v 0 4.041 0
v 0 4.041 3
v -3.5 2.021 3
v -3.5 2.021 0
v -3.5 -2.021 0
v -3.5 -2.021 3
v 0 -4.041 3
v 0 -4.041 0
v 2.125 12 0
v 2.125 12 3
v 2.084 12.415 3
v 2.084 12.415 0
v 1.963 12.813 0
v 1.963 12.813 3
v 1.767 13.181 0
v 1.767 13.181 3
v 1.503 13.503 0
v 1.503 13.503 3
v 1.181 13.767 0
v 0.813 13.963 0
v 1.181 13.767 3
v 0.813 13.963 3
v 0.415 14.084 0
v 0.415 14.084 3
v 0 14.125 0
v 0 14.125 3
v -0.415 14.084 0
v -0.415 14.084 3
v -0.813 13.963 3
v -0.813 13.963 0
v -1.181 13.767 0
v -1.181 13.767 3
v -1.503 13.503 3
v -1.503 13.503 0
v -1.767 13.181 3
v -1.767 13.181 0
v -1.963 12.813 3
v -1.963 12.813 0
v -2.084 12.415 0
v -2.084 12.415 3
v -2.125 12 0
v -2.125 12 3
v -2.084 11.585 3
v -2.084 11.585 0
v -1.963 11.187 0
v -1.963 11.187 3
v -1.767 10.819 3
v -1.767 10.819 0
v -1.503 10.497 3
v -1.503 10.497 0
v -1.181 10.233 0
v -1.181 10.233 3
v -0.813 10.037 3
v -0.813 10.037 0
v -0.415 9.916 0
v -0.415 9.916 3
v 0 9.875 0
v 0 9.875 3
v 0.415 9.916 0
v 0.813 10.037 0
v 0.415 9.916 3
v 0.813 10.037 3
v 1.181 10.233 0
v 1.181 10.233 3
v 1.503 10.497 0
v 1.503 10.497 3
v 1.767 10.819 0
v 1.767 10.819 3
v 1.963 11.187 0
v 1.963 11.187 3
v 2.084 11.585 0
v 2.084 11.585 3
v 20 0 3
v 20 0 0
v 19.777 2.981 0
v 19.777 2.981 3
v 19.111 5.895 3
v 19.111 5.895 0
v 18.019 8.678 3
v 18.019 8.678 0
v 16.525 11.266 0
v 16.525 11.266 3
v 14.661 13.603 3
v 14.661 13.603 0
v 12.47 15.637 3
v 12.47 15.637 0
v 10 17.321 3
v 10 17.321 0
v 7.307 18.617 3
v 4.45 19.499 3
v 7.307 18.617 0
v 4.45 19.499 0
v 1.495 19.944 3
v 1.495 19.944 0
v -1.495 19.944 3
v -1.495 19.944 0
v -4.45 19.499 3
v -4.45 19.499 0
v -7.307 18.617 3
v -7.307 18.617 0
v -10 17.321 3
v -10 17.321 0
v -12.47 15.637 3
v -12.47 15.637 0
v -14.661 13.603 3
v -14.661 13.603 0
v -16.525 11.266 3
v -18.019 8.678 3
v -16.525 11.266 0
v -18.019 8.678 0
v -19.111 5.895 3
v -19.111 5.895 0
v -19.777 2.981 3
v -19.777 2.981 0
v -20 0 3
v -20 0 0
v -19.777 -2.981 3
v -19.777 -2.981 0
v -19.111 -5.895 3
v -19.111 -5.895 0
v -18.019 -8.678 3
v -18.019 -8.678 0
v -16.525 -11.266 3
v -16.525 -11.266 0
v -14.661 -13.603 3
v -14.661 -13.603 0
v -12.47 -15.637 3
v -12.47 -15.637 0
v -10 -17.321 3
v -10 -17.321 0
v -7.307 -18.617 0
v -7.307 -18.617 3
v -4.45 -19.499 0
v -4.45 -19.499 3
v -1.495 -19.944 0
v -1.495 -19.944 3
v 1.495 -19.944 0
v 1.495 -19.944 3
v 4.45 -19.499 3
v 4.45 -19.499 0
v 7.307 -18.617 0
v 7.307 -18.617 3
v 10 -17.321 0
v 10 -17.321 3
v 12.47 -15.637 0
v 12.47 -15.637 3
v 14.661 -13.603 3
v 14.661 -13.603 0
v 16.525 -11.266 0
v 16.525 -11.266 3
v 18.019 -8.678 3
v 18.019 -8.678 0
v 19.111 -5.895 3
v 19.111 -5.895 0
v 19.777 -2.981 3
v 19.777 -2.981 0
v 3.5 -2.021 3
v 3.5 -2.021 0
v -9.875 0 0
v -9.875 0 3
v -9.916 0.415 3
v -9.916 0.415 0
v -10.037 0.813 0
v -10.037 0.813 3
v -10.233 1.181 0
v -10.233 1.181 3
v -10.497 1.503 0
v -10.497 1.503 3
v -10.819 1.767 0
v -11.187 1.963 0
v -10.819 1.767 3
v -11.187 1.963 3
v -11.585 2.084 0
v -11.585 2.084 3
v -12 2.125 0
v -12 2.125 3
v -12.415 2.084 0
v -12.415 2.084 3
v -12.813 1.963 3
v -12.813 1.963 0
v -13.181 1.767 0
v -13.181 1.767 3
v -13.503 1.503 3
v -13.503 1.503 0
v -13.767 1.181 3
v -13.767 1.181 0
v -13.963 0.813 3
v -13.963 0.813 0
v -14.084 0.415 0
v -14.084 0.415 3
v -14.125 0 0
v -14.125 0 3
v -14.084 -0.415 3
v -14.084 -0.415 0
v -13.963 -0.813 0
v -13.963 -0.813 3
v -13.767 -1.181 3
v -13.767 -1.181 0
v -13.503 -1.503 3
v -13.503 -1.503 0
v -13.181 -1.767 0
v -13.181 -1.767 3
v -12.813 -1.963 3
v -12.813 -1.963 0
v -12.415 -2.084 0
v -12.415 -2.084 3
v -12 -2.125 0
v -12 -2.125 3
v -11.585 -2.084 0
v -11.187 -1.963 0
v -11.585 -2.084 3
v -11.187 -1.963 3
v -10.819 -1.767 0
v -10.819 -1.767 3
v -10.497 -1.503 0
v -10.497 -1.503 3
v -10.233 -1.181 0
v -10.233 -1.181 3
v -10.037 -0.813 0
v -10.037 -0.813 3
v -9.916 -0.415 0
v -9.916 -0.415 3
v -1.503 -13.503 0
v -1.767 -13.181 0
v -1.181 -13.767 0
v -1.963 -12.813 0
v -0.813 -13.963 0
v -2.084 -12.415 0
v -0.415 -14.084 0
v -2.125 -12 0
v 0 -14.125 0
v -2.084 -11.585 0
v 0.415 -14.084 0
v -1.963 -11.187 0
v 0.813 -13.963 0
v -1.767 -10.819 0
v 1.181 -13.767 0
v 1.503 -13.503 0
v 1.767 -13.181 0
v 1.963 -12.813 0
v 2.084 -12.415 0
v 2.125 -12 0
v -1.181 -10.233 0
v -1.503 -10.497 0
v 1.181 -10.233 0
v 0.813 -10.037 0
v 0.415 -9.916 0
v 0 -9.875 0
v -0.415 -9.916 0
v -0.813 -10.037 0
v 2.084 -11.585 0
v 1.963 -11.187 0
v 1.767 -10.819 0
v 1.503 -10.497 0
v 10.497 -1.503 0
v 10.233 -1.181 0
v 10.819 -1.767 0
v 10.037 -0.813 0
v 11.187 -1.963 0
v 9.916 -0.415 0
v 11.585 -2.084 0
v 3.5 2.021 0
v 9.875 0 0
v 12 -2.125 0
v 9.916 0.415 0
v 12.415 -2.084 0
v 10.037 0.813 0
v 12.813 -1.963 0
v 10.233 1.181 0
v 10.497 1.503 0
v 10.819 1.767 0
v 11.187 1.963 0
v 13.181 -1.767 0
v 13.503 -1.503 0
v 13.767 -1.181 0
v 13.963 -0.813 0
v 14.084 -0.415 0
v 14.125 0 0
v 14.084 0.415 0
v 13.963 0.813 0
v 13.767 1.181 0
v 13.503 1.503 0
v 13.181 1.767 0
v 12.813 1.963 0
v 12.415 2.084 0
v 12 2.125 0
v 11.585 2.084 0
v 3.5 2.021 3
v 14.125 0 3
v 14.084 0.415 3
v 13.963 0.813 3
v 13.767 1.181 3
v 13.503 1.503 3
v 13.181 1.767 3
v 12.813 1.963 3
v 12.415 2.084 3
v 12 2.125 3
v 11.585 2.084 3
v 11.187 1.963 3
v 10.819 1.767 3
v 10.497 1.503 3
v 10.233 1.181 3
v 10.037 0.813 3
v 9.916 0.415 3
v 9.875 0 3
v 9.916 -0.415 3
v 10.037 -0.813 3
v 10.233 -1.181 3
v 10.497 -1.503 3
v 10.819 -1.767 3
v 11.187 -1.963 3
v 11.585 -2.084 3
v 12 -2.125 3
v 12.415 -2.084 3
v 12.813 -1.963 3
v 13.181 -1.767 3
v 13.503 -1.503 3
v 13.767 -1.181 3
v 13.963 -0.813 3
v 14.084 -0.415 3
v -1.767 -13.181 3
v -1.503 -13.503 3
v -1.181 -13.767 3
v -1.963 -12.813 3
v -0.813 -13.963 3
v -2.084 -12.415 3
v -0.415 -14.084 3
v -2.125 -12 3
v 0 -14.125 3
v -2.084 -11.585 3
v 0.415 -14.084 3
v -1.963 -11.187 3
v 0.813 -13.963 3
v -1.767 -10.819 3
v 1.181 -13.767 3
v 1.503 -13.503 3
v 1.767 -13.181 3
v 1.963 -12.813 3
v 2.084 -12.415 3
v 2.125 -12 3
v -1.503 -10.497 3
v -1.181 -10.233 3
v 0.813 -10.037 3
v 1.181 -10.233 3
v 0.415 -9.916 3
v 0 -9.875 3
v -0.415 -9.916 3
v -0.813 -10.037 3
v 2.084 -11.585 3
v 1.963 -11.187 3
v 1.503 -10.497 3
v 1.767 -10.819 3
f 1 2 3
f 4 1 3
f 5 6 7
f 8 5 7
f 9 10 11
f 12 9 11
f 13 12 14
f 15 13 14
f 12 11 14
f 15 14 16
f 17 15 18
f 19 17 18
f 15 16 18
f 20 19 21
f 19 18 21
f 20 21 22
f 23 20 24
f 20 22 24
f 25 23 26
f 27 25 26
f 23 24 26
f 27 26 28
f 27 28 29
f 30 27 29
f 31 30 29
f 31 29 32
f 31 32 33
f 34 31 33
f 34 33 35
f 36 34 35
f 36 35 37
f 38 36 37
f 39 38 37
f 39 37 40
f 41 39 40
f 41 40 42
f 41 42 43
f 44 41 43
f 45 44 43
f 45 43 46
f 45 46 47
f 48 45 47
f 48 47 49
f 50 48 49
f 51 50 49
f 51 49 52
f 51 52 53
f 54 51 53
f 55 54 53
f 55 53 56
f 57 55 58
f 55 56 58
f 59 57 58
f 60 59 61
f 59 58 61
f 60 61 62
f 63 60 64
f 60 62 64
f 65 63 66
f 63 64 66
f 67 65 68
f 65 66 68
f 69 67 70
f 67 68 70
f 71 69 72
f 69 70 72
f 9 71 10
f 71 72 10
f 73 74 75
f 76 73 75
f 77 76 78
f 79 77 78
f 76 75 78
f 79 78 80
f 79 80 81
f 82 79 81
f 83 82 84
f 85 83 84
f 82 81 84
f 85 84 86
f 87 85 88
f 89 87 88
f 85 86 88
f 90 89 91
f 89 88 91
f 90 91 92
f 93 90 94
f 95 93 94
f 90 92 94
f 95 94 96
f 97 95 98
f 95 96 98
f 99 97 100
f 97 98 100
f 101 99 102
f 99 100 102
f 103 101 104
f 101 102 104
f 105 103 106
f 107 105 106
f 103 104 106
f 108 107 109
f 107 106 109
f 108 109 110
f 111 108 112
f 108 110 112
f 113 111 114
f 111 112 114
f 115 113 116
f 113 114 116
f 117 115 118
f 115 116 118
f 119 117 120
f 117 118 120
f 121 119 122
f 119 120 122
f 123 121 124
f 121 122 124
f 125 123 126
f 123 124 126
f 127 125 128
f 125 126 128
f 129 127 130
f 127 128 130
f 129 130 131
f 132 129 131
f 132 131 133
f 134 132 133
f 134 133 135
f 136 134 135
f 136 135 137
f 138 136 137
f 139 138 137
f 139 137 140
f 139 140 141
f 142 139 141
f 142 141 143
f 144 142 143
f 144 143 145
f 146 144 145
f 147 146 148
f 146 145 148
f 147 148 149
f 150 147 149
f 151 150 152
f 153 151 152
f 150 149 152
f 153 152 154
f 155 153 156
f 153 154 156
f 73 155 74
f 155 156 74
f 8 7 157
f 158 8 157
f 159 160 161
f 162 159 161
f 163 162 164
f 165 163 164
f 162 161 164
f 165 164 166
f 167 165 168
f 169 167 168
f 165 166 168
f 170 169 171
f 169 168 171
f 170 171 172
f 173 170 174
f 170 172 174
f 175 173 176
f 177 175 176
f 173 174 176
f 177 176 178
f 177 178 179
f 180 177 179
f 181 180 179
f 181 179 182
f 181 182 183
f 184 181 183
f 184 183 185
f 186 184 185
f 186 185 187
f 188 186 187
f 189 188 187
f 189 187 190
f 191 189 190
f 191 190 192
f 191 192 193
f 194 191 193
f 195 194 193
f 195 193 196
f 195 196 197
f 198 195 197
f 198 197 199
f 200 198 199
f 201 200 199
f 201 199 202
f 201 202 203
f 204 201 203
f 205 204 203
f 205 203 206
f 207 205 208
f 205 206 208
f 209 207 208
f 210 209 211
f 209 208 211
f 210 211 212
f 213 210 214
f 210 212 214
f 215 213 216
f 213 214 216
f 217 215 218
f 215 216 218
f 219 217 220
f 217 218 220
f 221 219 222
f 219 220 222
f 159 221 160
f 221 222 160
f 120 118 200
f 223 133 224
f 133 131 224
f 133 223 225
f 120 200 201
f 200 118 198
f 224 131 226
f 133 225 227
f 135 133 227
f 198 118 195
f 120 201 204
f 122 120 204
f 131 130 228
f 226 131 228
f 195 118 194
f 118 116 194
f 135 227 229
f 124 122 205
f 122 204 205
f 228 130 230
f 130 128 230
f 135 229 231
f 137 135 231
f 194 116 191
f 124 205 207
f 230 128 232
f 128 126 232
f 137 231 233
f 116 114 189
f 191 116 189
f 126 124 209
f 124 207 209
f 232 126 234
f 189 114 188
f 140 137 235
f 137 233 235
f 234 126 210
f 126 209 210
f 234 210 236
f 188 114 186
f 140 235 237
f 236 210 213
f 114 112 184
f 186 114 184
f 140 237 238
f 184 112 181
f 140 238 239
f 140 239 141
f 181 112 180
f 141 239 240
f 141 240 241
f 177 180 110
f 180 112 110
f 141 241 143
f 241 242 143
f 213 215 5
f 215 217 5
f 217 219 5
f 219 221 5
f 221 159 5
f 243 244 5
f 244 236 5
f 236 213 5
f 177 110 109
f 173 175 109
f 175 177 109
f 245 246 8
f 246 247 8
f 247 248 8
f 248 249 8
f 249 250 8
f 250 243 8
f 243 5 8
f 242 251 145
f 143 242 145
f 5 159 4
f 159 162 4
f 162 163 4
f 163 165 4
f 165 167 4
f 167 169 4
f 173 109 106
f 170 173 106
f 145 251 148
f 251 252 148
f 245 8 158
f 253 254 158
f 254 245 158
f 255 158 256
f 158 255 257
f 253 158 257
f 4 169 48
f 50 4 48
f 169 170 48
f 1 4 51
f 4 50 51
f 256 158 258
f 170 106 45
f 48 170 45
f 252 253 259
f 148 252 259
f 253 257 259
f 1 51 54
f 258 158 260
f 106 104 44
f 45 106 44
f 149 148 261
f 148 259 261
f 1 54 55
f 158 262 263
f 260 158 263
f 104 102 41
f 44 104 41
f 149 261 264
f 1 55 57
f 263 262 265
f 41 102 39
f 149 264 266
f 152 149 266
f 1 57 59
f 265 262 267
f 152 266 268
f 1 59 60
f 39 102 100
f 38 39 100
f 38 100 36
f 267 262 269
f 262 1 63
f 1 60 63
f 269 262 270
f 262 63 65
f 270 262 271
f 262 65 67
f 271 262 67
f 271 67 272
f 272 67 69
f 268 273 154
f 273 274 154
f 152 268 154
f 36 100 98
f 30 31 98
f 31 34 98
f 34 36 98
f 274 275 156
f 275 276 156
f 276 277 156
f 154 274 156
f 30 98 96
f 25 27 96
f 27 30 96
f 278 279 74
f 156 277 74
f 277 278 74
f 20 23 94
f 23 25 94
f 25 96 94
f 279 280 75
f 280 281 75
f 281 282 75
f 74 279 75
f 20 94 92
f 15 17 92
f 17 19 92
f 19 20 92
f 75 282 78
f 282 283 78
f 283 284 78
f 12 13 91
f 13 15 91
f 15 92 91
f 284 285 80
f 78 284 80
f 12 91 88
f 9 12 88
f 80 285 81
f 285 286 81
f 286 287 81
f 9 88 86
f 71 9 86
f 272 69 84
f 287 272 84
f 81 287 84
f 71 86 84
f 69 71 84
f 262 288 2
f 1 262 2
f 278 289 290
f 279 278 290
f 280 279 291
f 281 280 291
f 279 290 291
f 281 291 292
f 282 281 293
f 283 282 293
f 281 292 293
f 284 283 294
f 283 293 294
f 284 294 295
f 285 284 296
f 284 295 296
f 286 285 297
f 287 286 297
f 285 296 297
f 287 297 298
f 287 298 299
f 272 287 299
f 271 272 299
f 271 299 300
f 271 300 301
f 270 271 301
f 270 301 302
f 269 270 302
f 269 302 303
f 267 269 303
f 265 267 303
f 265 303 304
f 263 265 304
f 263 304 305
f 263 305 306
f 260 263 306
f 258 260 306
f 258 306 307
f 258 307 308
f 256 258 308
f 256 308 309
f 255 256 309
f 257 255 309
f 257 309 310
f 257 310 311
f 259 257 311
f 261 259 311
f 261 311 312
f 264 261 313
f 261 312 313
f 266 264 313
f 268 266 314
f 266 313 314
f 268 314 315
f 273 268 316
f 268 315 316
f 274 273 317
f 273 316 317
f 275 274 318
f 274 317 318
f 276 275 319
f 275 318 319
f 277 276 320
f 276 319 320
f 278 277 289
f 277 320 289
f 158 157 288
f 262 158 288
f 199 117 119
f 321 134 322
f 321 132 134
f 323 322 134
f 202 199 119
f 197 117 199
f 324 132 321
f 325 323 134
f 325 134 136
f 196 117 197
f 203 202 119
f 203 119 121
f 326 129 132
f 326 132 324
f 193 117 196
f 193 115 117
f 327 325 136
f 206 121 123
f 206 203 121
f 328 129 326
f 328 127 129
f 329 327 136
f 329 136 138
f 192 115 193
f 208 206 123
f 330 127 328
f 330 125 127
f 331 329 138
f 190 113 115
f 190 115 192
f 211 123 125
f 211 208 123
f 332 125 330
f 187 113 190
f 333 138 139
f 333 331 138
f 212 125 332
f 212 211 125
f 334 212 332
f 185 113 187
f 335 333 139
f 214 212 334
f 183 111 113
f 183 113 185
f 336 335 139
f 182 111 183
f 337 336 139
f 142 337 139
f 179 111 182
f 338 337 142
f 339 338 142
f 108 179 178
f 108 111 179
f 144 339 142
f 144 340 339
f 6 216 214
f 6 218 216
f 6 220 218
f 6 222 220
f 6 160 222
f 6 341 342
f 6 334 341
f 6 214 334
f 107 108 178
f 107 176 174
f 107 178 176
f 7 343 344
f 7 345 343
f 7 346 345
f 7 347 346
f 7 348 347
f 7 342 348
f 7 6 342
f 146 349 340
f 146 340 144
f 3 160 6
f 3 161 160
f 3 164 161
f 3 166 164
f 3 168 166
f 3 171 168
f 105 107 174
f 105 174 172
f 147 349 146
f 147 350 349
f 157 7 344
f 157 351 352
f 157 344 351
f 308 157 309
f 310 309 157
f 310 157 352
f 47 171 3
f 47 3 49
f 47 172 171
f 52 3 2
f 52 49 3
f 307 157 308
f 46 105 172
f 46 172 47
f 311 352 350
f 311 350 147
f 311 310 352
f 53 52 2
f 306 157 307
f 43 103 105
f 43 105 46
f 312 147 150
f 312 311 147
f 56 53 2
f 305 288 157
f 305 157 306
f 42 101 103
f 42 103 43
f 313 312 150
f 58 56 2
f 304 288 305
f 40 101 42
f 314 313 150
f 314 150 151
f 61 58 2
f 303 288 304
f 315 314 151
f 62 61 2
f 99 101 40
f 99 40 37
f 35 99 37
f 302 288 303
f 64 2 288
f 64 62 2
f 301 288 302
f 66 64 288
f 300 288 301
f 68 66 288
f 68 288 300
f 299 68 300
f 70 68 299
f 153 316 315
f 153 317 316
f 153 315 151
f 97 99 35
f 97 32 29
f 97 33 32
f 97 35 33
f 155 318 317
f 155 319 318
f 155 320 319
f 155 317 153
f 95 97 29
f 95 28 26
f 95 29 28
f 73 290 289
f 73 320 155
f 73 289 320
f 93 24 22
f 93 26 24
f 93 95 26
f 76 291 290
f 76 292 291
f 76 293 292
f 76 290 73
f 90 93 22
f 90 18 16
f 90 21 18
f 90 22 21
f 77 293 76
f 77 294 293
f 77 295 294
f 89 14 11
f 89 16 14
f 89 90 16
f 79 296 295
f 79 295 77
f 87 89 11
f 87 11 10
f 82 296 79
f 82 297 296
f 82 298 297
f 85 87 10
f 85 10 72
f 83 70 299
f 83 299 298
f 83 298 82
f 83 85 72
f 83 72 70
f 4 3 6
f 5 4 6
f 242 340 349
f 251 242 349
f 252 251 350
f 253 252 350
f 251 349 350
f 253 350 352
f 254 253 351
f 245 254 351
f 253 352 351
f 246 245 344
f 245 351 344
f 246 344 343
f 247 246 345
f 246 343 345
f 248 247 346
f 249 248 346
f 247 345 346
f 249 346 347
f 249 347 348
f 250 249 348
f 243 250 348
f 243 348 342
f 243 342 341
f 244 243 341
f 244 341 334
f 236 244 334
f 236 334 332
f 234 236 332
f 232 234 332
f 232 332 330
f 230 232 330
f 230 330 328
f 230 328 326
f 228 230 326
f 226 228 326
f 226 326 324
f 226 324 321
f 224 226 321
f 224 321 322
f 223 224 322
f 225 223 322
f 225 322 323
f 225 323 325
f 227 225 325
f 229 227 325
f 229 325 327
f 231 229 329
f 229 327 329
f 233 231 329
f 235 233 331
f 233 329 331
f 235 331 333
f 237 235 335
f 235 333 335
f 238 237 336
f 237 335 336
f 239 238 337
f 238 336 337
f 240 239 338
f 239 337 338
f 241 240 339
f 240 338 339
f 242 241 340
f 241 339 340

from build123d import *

# Parameters (mm, degrees)
SKETCH1_R           = 20
BOSS_EXTRUDE1_DEPTH = 3
CUT_EXTRUDE2_DEPTH  = 3
SKETCH4_R           = 2.125
CUT_EXTRUDE3_DEPTH  = 10


with BuildPart() as part:
    # Sketch1 → Boss-Extrude1 (new body)
    with BuildSketch(Plane.XY):
        Circle(SKETCH1_R)
    extrude(amount=BOSS_EXTRUDE1_DEPTH)

    # Sketch3 → Cut-Extrude2 (cut)
    with BuildSketch(Plane.XY.offset(3)):
        Polygon((0, 4.041451884), (-3.5, 2.020725942), (-3.5, -2.020725942), (0, -4.041451884), (3.5, -2.020725942), (3.5, 2.020725942), align=None)
    extrude(amount=-CUT_EXTRUDE2_DEPTH, mode=Mode.SUBTRACT)

    # Sketch4 → Cut-Extrude3 (cut)
    with BuildSketch(Plane.XY.offset(3)):
        with Locations((0, 12)):
            Circle(SKETCH4_R)
        with Locations((12, 0)):
            Circle(SKETCH4_R)
        with Locations((0, -12)):
            Circle(SKETCH4_R)
        with Locations((-12, 0)):
            Circle(SKETCH4_R)
    extrude(amount=-CUT_EXTRUDE3_DEPTH, mode=Mode.SUBTRACT)


solid = part.part
